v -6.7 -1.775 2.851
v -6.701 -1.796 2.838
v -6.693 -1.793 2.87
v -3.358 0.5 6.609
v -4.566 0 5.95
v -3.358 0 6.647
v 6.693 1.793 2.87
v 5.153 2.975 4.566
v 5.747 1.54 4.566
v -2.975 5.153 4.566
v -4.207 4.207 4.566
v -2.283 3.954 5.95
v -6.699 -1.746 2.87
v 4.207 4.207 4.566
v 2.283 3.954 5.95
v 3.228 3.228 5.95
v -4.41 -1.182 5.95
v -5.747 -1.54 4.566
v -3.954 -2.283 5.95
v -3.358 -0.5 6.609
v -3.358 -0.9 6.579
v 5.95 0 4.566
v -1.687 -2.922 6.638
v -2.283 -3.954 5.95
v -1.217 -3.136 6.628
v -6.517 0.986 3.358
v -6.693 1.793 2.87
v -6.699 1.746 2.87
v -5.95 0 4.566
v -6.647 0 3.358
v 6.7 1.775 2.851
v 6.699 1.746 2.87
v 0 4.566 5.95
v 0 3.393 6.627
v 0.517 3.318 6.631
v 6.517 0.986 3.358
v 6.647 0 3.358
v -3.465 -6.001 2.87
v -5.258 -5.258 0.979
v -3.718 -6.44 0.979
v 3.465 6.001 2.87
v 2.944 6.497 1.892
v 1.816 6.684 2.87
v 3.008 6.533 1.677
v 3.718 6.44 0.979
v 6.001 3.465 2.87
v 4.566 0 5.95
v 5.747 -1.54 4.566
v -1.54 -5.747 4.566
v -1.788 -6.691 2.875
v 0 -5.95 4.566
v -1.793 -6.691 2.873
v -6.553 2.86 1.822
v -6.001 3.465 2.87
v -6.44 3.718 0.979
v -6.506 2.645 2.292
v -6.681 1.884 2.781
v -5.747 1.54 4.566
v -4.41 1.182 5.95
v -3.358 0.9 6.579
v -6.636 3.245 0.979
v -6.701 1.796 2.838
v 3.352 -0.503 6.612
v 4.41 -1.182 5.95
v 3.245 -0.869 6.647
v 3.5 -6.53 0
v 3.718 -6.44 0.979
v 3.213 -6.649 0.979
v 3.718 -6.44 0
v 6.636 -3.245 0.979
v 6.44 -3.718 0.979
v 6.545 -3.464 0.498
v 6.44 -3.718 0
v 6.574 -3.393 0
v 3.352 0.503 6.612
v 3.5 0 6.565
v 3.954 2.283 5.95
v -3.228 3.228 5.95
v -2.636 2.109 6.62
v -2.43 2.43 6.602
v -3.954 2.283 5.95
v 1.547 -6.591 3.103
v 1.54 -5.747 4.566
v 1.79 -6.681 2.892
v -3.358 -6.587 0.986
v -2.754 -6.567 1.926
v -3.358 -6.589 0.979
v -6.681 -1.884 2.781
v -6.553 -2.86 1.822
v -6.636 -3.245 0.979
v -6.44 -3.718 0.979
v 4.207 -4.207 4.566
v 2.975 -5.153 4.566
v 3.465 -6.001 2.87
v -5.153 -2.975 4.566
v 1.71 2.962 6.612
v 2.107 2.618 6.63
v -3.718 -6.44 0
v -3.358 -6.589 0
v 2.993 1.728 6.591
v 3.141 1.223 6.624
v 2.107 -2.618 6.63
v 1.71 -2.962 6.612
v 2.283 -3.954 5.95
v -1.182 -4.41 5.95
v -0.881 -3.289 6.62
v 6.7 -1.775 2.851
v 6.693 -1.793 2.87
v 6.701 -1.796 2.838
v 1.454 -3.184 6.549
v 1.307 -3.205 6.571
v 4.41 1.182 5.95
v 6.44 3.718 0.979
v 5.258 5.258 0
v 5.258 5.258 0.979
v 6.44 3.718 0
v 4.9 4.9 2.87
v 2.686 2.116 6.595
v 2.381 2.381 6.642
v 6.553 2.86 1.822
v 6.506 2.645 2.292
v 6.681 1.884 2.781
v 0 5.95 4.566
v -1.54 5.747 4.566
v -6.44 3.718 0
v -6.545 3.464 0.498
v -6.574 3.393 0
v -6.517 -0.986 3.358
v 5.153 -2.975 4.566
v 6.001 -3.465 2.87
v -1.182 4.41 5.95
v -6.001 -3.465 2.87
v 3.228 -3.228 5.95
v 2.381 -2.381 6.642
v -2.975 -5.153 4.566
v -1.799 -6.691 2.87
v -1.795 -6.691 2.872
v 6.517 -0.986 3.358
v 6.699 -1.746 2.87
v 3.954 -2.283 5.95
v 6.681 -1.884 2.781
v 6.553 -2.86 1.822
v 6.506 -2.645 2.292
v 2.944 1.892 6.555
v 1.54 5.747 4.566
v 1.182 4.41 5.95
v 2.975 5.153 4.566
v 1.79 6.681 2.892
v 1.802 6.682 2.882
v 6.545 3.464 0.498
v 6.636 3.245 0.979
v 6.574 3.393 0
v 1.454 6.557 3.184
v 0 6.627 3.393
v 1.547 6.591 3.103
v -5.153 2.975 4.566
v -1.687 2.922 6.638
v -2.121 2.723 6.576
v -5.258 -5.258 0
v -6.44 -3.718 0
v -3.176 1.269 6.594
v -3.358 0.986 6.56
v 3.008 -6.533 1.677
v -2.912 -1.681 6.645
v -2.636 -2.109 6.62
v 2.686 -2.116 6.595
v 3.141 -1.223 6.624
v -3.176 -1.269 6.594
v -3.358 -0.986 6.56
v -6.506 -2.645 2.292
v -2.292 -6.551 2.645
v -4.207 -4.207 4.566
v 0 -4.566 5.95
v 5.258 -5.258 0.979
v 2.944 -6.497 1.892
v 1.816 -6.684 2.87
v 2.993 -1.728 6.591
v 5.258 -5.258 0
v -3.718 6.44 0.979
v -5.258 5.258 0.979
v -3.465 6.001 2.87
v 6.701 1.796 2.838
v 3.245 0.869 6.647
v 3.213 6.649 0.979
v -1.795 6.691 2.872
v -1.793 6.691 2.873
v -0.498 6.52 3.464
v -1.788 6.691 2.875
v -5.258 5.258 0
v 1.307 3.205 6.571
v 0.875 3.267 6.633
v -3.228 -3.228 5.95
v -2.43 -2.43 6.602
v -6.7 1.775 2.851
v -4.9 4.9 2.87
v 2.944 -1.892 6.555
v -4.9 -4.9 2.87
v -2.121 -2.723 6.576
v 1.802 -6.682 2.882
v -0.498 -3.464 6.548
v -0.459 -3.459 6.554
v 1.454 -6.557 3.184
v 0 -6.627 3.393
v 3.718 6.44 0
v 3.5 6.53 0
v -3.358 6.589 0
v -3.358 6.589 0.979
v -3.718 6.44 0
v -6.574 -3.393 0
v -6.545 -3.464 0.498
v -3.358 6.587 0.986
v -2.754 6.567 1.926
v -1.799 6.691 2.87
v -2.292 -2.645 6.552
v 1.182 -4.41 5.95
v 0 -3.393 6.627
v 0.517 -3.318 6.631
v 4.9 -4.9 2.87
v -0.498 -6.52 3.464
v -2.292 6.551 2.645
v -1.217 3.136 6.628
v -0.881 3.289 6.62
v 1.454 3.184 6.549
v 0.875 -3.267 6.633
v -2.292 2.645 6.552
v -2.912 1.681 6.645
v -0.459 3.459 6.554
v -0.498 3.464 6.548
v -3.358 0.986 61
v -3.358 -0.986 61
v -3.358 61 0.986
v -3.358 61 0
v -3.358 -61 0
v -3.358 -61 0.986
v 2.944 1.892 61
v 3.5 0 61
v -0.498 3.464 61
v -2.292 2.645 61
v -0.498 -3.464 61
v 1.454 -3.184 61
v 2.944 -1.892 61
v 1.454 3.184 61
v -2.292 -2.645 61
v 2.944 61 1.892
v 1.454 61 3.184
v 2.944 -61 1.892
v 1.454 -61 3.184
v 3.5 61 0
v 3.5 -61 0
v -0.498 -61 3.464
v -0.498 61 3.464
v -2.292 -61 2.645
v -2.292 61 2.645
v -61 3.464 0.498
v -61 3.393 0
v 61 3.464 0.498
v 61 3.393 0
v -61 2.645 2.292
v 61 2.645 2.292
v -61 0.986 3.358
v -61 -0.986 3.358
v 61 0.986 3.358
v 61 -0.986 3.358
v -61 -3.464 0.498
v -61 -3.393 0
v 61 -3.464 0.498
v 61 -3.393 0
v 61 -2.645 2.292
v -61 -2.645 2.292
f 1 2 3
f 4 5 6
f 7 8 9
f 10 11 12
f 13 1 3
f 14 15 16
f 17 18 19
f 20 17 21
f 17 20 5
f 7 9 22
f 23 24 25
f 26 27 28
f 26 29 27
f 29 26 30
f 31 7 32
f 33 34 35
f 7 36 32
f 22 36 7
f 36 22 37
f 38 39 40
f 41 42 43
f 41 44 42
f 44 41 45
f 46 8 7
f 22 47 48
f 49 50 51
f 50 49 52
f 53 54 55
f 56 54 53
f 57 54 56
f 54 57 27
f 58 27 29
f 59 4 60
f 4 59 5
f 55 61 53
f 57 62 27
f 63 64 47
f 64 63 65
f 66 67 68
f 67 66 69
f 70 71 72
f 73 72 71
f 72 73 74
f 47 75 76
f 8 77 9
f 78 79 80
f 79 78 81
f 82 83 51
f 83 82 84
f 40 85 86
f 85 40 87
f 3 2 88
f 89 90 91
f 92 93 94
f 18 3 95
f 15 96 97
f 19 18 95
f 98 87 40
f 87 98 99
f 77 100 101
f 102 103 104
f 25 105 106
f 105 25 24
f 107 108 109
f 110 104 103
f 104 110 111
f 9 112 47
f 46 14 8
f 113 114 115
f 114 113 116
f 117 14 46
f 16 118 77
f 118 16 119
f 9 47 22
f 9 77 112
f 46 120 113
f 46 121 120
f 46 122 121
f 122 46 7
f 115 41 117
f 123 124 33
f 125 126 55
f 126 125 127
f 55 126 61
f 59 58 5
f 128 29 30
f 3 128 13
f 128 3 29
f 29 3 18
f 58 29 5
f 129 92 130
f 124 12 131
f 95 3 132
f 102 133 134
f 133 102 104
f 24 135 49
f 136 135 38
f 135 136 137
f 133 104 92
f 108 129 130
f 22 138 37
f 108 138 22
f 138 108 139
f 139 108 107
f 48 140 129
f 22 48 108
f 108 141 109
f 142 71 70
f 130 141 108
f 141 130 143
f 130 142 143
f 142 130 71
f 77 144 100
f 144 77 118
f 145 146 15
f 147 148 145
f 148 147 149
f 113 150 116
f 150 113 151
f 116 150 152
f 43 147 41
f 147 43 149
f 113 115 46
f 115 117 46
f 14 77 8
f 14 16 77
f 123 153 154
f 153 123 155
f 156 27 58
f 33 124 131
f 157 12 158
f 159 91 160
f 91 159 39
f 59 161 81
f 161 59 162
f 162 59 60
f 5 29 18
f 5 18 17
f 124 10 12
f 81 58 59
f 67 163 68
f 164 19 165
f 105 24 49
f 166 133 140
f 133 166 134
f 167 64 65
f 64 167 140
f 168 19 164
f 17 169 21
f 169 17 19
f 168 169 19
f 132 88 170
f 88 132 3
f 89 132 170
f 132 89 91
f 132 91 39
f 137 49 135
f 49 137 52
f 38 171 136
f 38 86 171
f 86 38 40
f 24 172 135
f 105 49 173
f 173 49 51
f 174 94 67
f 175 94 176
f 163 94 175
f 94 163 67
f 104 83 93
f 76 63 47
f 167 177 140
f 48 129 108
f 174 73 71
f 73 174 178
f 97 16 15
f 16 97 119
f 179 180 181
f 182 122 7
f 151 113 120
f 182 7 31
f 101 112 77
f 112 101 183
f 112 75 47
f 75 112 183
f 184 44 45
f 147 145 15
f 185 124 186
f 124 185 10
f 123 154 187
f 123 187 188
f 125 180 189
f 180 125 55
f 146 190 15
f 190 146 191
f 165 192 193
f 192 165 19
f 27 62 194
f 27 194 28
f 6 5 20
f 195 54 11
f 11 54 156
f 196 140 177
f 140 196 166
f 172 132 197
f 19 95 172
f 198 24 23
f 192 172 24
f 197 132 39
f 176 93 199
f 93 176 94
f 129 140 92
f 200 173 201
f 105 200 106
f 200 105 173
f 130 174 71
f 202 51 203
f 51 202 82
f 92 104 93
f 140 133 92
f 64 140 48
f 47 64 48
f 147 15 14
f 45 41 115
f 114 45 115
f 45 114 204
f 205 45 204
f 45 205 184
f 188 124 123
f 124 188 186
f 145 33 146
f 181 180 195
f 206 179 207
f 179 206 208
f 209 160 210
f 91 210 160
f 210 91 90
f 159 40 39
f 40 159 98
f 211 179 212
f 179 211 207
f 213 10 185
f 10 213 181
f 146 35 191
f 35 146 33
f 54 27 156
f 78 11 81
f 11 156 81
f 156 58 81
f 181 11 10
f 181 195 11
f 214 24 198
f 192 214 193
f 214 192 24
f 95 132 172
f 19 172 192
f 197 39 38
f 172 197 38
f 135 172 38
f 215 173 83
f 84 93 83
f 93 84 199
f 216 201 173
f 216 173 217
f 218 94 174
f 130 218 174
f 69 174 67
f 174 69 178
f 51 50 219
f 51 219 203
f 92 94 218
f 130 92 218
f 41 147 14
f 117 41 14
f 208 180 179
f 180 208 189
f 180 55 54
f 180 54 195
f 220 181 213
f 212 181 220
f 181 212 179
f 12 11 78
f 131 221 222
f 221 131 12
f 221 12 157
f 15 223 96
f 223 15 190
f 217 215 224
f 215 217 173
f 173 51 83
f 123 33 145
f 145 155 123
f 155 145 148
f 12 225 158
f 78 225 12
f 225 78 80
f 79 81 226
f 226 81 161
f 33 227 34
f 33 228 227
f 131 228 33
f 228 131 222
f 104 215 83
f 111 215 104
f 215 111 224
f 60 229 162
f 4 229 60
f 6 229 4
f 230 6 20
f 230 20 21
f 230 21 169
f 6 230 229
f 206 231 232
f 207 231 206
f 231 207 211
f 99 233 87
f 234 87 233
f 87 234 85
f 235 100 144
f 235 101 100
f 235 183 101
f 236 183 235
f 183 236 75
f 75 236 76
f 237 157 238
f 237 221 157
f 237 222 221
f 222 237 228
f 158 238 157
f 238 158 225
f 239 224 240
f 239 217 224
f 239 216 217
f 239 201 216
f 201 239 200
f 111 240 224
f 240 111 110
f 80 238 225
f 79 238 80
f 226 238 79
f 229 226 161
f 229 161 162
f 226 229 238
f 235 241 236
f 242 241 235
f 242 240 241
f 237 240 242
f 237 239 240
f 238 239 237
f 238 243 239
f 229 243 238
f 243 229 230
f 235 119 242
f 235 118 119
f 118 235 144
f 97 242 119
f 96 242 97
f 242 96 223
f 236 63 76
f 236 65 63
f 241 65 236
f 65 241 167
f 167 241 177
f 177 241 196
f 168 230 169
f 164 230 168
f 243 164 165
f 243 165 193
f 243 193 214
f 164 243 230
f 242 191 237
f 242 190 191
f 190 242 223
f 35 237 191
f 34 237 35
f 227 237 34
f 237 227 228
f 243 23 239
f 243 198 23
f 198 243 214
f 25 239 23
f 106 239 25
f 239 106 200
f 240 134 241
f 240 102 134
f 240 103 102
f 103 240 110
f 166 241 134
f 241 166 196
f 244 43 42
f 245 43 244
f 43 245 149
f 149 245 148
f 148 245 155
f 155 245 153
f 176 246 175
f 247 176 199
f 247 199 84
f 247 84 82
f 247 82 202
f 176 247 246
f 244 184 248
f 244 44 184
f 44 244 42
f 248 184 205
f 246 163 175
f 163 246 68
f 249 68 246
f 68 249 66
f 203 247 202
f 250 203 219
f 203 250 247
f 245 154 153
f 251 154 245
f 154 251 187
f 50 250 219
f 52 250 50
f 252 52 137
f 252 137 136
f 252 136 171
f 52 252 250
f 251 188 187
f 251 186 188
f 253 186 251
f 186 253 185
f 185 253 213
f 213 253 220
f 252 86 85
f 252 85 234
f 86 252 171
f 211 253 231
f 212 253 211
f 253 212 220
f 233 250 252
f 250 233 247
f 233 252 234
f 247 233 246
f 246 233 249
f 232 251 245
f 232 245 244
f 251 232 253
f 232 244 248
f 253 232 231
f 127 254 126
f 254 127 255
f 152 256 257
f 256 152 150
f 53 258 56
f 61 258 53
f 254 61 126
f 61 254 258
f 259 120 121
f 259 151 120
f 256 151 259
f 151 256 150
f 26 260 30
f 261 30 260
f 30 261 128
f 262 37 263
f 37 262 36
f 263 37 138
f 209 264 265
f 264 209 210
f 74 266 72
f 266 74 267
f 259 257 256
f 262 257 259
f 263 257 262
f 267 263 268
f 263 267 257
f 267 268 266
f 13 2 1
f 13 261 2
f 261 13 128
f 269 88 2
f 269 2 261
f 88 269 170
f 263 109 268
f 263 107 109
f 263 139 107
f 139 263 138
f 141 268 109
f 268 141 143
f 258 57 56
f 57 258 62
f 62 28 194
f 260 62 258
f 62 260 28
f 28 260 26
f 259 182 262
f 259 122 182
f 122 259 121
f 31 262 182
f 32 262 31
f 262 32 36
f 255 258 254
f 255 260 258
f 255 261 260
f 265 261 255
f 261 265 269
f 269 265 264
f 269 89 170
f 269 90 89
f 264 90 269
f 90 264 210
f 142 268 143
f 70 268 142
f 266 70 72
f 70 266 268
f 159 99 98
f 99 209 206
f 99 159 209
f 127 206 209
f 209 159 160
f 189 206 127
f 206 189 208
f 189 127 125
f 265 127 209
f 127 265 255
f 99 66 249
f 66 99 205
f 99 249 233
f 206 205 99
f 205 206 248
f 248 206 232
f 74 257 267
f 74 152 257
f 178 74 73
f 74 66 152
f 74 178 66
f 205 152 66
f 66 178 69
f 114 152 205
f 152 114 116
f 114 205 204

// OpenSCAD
difference(){
    union(){
        sphere(7.5);
            cylinder(h=122 , r = 3.5, center = true);
        rotate([90,0,0]){
            cylinder(h=122 , r = 3.5, center = true);
        }
        rotate([0,90,0]){
            cylinder(h=122 , r = 3.5, center = true);
        }
    }
    translate([0, 0, -61.5]){
        cube([123, 123, 123],true);
    }
}
